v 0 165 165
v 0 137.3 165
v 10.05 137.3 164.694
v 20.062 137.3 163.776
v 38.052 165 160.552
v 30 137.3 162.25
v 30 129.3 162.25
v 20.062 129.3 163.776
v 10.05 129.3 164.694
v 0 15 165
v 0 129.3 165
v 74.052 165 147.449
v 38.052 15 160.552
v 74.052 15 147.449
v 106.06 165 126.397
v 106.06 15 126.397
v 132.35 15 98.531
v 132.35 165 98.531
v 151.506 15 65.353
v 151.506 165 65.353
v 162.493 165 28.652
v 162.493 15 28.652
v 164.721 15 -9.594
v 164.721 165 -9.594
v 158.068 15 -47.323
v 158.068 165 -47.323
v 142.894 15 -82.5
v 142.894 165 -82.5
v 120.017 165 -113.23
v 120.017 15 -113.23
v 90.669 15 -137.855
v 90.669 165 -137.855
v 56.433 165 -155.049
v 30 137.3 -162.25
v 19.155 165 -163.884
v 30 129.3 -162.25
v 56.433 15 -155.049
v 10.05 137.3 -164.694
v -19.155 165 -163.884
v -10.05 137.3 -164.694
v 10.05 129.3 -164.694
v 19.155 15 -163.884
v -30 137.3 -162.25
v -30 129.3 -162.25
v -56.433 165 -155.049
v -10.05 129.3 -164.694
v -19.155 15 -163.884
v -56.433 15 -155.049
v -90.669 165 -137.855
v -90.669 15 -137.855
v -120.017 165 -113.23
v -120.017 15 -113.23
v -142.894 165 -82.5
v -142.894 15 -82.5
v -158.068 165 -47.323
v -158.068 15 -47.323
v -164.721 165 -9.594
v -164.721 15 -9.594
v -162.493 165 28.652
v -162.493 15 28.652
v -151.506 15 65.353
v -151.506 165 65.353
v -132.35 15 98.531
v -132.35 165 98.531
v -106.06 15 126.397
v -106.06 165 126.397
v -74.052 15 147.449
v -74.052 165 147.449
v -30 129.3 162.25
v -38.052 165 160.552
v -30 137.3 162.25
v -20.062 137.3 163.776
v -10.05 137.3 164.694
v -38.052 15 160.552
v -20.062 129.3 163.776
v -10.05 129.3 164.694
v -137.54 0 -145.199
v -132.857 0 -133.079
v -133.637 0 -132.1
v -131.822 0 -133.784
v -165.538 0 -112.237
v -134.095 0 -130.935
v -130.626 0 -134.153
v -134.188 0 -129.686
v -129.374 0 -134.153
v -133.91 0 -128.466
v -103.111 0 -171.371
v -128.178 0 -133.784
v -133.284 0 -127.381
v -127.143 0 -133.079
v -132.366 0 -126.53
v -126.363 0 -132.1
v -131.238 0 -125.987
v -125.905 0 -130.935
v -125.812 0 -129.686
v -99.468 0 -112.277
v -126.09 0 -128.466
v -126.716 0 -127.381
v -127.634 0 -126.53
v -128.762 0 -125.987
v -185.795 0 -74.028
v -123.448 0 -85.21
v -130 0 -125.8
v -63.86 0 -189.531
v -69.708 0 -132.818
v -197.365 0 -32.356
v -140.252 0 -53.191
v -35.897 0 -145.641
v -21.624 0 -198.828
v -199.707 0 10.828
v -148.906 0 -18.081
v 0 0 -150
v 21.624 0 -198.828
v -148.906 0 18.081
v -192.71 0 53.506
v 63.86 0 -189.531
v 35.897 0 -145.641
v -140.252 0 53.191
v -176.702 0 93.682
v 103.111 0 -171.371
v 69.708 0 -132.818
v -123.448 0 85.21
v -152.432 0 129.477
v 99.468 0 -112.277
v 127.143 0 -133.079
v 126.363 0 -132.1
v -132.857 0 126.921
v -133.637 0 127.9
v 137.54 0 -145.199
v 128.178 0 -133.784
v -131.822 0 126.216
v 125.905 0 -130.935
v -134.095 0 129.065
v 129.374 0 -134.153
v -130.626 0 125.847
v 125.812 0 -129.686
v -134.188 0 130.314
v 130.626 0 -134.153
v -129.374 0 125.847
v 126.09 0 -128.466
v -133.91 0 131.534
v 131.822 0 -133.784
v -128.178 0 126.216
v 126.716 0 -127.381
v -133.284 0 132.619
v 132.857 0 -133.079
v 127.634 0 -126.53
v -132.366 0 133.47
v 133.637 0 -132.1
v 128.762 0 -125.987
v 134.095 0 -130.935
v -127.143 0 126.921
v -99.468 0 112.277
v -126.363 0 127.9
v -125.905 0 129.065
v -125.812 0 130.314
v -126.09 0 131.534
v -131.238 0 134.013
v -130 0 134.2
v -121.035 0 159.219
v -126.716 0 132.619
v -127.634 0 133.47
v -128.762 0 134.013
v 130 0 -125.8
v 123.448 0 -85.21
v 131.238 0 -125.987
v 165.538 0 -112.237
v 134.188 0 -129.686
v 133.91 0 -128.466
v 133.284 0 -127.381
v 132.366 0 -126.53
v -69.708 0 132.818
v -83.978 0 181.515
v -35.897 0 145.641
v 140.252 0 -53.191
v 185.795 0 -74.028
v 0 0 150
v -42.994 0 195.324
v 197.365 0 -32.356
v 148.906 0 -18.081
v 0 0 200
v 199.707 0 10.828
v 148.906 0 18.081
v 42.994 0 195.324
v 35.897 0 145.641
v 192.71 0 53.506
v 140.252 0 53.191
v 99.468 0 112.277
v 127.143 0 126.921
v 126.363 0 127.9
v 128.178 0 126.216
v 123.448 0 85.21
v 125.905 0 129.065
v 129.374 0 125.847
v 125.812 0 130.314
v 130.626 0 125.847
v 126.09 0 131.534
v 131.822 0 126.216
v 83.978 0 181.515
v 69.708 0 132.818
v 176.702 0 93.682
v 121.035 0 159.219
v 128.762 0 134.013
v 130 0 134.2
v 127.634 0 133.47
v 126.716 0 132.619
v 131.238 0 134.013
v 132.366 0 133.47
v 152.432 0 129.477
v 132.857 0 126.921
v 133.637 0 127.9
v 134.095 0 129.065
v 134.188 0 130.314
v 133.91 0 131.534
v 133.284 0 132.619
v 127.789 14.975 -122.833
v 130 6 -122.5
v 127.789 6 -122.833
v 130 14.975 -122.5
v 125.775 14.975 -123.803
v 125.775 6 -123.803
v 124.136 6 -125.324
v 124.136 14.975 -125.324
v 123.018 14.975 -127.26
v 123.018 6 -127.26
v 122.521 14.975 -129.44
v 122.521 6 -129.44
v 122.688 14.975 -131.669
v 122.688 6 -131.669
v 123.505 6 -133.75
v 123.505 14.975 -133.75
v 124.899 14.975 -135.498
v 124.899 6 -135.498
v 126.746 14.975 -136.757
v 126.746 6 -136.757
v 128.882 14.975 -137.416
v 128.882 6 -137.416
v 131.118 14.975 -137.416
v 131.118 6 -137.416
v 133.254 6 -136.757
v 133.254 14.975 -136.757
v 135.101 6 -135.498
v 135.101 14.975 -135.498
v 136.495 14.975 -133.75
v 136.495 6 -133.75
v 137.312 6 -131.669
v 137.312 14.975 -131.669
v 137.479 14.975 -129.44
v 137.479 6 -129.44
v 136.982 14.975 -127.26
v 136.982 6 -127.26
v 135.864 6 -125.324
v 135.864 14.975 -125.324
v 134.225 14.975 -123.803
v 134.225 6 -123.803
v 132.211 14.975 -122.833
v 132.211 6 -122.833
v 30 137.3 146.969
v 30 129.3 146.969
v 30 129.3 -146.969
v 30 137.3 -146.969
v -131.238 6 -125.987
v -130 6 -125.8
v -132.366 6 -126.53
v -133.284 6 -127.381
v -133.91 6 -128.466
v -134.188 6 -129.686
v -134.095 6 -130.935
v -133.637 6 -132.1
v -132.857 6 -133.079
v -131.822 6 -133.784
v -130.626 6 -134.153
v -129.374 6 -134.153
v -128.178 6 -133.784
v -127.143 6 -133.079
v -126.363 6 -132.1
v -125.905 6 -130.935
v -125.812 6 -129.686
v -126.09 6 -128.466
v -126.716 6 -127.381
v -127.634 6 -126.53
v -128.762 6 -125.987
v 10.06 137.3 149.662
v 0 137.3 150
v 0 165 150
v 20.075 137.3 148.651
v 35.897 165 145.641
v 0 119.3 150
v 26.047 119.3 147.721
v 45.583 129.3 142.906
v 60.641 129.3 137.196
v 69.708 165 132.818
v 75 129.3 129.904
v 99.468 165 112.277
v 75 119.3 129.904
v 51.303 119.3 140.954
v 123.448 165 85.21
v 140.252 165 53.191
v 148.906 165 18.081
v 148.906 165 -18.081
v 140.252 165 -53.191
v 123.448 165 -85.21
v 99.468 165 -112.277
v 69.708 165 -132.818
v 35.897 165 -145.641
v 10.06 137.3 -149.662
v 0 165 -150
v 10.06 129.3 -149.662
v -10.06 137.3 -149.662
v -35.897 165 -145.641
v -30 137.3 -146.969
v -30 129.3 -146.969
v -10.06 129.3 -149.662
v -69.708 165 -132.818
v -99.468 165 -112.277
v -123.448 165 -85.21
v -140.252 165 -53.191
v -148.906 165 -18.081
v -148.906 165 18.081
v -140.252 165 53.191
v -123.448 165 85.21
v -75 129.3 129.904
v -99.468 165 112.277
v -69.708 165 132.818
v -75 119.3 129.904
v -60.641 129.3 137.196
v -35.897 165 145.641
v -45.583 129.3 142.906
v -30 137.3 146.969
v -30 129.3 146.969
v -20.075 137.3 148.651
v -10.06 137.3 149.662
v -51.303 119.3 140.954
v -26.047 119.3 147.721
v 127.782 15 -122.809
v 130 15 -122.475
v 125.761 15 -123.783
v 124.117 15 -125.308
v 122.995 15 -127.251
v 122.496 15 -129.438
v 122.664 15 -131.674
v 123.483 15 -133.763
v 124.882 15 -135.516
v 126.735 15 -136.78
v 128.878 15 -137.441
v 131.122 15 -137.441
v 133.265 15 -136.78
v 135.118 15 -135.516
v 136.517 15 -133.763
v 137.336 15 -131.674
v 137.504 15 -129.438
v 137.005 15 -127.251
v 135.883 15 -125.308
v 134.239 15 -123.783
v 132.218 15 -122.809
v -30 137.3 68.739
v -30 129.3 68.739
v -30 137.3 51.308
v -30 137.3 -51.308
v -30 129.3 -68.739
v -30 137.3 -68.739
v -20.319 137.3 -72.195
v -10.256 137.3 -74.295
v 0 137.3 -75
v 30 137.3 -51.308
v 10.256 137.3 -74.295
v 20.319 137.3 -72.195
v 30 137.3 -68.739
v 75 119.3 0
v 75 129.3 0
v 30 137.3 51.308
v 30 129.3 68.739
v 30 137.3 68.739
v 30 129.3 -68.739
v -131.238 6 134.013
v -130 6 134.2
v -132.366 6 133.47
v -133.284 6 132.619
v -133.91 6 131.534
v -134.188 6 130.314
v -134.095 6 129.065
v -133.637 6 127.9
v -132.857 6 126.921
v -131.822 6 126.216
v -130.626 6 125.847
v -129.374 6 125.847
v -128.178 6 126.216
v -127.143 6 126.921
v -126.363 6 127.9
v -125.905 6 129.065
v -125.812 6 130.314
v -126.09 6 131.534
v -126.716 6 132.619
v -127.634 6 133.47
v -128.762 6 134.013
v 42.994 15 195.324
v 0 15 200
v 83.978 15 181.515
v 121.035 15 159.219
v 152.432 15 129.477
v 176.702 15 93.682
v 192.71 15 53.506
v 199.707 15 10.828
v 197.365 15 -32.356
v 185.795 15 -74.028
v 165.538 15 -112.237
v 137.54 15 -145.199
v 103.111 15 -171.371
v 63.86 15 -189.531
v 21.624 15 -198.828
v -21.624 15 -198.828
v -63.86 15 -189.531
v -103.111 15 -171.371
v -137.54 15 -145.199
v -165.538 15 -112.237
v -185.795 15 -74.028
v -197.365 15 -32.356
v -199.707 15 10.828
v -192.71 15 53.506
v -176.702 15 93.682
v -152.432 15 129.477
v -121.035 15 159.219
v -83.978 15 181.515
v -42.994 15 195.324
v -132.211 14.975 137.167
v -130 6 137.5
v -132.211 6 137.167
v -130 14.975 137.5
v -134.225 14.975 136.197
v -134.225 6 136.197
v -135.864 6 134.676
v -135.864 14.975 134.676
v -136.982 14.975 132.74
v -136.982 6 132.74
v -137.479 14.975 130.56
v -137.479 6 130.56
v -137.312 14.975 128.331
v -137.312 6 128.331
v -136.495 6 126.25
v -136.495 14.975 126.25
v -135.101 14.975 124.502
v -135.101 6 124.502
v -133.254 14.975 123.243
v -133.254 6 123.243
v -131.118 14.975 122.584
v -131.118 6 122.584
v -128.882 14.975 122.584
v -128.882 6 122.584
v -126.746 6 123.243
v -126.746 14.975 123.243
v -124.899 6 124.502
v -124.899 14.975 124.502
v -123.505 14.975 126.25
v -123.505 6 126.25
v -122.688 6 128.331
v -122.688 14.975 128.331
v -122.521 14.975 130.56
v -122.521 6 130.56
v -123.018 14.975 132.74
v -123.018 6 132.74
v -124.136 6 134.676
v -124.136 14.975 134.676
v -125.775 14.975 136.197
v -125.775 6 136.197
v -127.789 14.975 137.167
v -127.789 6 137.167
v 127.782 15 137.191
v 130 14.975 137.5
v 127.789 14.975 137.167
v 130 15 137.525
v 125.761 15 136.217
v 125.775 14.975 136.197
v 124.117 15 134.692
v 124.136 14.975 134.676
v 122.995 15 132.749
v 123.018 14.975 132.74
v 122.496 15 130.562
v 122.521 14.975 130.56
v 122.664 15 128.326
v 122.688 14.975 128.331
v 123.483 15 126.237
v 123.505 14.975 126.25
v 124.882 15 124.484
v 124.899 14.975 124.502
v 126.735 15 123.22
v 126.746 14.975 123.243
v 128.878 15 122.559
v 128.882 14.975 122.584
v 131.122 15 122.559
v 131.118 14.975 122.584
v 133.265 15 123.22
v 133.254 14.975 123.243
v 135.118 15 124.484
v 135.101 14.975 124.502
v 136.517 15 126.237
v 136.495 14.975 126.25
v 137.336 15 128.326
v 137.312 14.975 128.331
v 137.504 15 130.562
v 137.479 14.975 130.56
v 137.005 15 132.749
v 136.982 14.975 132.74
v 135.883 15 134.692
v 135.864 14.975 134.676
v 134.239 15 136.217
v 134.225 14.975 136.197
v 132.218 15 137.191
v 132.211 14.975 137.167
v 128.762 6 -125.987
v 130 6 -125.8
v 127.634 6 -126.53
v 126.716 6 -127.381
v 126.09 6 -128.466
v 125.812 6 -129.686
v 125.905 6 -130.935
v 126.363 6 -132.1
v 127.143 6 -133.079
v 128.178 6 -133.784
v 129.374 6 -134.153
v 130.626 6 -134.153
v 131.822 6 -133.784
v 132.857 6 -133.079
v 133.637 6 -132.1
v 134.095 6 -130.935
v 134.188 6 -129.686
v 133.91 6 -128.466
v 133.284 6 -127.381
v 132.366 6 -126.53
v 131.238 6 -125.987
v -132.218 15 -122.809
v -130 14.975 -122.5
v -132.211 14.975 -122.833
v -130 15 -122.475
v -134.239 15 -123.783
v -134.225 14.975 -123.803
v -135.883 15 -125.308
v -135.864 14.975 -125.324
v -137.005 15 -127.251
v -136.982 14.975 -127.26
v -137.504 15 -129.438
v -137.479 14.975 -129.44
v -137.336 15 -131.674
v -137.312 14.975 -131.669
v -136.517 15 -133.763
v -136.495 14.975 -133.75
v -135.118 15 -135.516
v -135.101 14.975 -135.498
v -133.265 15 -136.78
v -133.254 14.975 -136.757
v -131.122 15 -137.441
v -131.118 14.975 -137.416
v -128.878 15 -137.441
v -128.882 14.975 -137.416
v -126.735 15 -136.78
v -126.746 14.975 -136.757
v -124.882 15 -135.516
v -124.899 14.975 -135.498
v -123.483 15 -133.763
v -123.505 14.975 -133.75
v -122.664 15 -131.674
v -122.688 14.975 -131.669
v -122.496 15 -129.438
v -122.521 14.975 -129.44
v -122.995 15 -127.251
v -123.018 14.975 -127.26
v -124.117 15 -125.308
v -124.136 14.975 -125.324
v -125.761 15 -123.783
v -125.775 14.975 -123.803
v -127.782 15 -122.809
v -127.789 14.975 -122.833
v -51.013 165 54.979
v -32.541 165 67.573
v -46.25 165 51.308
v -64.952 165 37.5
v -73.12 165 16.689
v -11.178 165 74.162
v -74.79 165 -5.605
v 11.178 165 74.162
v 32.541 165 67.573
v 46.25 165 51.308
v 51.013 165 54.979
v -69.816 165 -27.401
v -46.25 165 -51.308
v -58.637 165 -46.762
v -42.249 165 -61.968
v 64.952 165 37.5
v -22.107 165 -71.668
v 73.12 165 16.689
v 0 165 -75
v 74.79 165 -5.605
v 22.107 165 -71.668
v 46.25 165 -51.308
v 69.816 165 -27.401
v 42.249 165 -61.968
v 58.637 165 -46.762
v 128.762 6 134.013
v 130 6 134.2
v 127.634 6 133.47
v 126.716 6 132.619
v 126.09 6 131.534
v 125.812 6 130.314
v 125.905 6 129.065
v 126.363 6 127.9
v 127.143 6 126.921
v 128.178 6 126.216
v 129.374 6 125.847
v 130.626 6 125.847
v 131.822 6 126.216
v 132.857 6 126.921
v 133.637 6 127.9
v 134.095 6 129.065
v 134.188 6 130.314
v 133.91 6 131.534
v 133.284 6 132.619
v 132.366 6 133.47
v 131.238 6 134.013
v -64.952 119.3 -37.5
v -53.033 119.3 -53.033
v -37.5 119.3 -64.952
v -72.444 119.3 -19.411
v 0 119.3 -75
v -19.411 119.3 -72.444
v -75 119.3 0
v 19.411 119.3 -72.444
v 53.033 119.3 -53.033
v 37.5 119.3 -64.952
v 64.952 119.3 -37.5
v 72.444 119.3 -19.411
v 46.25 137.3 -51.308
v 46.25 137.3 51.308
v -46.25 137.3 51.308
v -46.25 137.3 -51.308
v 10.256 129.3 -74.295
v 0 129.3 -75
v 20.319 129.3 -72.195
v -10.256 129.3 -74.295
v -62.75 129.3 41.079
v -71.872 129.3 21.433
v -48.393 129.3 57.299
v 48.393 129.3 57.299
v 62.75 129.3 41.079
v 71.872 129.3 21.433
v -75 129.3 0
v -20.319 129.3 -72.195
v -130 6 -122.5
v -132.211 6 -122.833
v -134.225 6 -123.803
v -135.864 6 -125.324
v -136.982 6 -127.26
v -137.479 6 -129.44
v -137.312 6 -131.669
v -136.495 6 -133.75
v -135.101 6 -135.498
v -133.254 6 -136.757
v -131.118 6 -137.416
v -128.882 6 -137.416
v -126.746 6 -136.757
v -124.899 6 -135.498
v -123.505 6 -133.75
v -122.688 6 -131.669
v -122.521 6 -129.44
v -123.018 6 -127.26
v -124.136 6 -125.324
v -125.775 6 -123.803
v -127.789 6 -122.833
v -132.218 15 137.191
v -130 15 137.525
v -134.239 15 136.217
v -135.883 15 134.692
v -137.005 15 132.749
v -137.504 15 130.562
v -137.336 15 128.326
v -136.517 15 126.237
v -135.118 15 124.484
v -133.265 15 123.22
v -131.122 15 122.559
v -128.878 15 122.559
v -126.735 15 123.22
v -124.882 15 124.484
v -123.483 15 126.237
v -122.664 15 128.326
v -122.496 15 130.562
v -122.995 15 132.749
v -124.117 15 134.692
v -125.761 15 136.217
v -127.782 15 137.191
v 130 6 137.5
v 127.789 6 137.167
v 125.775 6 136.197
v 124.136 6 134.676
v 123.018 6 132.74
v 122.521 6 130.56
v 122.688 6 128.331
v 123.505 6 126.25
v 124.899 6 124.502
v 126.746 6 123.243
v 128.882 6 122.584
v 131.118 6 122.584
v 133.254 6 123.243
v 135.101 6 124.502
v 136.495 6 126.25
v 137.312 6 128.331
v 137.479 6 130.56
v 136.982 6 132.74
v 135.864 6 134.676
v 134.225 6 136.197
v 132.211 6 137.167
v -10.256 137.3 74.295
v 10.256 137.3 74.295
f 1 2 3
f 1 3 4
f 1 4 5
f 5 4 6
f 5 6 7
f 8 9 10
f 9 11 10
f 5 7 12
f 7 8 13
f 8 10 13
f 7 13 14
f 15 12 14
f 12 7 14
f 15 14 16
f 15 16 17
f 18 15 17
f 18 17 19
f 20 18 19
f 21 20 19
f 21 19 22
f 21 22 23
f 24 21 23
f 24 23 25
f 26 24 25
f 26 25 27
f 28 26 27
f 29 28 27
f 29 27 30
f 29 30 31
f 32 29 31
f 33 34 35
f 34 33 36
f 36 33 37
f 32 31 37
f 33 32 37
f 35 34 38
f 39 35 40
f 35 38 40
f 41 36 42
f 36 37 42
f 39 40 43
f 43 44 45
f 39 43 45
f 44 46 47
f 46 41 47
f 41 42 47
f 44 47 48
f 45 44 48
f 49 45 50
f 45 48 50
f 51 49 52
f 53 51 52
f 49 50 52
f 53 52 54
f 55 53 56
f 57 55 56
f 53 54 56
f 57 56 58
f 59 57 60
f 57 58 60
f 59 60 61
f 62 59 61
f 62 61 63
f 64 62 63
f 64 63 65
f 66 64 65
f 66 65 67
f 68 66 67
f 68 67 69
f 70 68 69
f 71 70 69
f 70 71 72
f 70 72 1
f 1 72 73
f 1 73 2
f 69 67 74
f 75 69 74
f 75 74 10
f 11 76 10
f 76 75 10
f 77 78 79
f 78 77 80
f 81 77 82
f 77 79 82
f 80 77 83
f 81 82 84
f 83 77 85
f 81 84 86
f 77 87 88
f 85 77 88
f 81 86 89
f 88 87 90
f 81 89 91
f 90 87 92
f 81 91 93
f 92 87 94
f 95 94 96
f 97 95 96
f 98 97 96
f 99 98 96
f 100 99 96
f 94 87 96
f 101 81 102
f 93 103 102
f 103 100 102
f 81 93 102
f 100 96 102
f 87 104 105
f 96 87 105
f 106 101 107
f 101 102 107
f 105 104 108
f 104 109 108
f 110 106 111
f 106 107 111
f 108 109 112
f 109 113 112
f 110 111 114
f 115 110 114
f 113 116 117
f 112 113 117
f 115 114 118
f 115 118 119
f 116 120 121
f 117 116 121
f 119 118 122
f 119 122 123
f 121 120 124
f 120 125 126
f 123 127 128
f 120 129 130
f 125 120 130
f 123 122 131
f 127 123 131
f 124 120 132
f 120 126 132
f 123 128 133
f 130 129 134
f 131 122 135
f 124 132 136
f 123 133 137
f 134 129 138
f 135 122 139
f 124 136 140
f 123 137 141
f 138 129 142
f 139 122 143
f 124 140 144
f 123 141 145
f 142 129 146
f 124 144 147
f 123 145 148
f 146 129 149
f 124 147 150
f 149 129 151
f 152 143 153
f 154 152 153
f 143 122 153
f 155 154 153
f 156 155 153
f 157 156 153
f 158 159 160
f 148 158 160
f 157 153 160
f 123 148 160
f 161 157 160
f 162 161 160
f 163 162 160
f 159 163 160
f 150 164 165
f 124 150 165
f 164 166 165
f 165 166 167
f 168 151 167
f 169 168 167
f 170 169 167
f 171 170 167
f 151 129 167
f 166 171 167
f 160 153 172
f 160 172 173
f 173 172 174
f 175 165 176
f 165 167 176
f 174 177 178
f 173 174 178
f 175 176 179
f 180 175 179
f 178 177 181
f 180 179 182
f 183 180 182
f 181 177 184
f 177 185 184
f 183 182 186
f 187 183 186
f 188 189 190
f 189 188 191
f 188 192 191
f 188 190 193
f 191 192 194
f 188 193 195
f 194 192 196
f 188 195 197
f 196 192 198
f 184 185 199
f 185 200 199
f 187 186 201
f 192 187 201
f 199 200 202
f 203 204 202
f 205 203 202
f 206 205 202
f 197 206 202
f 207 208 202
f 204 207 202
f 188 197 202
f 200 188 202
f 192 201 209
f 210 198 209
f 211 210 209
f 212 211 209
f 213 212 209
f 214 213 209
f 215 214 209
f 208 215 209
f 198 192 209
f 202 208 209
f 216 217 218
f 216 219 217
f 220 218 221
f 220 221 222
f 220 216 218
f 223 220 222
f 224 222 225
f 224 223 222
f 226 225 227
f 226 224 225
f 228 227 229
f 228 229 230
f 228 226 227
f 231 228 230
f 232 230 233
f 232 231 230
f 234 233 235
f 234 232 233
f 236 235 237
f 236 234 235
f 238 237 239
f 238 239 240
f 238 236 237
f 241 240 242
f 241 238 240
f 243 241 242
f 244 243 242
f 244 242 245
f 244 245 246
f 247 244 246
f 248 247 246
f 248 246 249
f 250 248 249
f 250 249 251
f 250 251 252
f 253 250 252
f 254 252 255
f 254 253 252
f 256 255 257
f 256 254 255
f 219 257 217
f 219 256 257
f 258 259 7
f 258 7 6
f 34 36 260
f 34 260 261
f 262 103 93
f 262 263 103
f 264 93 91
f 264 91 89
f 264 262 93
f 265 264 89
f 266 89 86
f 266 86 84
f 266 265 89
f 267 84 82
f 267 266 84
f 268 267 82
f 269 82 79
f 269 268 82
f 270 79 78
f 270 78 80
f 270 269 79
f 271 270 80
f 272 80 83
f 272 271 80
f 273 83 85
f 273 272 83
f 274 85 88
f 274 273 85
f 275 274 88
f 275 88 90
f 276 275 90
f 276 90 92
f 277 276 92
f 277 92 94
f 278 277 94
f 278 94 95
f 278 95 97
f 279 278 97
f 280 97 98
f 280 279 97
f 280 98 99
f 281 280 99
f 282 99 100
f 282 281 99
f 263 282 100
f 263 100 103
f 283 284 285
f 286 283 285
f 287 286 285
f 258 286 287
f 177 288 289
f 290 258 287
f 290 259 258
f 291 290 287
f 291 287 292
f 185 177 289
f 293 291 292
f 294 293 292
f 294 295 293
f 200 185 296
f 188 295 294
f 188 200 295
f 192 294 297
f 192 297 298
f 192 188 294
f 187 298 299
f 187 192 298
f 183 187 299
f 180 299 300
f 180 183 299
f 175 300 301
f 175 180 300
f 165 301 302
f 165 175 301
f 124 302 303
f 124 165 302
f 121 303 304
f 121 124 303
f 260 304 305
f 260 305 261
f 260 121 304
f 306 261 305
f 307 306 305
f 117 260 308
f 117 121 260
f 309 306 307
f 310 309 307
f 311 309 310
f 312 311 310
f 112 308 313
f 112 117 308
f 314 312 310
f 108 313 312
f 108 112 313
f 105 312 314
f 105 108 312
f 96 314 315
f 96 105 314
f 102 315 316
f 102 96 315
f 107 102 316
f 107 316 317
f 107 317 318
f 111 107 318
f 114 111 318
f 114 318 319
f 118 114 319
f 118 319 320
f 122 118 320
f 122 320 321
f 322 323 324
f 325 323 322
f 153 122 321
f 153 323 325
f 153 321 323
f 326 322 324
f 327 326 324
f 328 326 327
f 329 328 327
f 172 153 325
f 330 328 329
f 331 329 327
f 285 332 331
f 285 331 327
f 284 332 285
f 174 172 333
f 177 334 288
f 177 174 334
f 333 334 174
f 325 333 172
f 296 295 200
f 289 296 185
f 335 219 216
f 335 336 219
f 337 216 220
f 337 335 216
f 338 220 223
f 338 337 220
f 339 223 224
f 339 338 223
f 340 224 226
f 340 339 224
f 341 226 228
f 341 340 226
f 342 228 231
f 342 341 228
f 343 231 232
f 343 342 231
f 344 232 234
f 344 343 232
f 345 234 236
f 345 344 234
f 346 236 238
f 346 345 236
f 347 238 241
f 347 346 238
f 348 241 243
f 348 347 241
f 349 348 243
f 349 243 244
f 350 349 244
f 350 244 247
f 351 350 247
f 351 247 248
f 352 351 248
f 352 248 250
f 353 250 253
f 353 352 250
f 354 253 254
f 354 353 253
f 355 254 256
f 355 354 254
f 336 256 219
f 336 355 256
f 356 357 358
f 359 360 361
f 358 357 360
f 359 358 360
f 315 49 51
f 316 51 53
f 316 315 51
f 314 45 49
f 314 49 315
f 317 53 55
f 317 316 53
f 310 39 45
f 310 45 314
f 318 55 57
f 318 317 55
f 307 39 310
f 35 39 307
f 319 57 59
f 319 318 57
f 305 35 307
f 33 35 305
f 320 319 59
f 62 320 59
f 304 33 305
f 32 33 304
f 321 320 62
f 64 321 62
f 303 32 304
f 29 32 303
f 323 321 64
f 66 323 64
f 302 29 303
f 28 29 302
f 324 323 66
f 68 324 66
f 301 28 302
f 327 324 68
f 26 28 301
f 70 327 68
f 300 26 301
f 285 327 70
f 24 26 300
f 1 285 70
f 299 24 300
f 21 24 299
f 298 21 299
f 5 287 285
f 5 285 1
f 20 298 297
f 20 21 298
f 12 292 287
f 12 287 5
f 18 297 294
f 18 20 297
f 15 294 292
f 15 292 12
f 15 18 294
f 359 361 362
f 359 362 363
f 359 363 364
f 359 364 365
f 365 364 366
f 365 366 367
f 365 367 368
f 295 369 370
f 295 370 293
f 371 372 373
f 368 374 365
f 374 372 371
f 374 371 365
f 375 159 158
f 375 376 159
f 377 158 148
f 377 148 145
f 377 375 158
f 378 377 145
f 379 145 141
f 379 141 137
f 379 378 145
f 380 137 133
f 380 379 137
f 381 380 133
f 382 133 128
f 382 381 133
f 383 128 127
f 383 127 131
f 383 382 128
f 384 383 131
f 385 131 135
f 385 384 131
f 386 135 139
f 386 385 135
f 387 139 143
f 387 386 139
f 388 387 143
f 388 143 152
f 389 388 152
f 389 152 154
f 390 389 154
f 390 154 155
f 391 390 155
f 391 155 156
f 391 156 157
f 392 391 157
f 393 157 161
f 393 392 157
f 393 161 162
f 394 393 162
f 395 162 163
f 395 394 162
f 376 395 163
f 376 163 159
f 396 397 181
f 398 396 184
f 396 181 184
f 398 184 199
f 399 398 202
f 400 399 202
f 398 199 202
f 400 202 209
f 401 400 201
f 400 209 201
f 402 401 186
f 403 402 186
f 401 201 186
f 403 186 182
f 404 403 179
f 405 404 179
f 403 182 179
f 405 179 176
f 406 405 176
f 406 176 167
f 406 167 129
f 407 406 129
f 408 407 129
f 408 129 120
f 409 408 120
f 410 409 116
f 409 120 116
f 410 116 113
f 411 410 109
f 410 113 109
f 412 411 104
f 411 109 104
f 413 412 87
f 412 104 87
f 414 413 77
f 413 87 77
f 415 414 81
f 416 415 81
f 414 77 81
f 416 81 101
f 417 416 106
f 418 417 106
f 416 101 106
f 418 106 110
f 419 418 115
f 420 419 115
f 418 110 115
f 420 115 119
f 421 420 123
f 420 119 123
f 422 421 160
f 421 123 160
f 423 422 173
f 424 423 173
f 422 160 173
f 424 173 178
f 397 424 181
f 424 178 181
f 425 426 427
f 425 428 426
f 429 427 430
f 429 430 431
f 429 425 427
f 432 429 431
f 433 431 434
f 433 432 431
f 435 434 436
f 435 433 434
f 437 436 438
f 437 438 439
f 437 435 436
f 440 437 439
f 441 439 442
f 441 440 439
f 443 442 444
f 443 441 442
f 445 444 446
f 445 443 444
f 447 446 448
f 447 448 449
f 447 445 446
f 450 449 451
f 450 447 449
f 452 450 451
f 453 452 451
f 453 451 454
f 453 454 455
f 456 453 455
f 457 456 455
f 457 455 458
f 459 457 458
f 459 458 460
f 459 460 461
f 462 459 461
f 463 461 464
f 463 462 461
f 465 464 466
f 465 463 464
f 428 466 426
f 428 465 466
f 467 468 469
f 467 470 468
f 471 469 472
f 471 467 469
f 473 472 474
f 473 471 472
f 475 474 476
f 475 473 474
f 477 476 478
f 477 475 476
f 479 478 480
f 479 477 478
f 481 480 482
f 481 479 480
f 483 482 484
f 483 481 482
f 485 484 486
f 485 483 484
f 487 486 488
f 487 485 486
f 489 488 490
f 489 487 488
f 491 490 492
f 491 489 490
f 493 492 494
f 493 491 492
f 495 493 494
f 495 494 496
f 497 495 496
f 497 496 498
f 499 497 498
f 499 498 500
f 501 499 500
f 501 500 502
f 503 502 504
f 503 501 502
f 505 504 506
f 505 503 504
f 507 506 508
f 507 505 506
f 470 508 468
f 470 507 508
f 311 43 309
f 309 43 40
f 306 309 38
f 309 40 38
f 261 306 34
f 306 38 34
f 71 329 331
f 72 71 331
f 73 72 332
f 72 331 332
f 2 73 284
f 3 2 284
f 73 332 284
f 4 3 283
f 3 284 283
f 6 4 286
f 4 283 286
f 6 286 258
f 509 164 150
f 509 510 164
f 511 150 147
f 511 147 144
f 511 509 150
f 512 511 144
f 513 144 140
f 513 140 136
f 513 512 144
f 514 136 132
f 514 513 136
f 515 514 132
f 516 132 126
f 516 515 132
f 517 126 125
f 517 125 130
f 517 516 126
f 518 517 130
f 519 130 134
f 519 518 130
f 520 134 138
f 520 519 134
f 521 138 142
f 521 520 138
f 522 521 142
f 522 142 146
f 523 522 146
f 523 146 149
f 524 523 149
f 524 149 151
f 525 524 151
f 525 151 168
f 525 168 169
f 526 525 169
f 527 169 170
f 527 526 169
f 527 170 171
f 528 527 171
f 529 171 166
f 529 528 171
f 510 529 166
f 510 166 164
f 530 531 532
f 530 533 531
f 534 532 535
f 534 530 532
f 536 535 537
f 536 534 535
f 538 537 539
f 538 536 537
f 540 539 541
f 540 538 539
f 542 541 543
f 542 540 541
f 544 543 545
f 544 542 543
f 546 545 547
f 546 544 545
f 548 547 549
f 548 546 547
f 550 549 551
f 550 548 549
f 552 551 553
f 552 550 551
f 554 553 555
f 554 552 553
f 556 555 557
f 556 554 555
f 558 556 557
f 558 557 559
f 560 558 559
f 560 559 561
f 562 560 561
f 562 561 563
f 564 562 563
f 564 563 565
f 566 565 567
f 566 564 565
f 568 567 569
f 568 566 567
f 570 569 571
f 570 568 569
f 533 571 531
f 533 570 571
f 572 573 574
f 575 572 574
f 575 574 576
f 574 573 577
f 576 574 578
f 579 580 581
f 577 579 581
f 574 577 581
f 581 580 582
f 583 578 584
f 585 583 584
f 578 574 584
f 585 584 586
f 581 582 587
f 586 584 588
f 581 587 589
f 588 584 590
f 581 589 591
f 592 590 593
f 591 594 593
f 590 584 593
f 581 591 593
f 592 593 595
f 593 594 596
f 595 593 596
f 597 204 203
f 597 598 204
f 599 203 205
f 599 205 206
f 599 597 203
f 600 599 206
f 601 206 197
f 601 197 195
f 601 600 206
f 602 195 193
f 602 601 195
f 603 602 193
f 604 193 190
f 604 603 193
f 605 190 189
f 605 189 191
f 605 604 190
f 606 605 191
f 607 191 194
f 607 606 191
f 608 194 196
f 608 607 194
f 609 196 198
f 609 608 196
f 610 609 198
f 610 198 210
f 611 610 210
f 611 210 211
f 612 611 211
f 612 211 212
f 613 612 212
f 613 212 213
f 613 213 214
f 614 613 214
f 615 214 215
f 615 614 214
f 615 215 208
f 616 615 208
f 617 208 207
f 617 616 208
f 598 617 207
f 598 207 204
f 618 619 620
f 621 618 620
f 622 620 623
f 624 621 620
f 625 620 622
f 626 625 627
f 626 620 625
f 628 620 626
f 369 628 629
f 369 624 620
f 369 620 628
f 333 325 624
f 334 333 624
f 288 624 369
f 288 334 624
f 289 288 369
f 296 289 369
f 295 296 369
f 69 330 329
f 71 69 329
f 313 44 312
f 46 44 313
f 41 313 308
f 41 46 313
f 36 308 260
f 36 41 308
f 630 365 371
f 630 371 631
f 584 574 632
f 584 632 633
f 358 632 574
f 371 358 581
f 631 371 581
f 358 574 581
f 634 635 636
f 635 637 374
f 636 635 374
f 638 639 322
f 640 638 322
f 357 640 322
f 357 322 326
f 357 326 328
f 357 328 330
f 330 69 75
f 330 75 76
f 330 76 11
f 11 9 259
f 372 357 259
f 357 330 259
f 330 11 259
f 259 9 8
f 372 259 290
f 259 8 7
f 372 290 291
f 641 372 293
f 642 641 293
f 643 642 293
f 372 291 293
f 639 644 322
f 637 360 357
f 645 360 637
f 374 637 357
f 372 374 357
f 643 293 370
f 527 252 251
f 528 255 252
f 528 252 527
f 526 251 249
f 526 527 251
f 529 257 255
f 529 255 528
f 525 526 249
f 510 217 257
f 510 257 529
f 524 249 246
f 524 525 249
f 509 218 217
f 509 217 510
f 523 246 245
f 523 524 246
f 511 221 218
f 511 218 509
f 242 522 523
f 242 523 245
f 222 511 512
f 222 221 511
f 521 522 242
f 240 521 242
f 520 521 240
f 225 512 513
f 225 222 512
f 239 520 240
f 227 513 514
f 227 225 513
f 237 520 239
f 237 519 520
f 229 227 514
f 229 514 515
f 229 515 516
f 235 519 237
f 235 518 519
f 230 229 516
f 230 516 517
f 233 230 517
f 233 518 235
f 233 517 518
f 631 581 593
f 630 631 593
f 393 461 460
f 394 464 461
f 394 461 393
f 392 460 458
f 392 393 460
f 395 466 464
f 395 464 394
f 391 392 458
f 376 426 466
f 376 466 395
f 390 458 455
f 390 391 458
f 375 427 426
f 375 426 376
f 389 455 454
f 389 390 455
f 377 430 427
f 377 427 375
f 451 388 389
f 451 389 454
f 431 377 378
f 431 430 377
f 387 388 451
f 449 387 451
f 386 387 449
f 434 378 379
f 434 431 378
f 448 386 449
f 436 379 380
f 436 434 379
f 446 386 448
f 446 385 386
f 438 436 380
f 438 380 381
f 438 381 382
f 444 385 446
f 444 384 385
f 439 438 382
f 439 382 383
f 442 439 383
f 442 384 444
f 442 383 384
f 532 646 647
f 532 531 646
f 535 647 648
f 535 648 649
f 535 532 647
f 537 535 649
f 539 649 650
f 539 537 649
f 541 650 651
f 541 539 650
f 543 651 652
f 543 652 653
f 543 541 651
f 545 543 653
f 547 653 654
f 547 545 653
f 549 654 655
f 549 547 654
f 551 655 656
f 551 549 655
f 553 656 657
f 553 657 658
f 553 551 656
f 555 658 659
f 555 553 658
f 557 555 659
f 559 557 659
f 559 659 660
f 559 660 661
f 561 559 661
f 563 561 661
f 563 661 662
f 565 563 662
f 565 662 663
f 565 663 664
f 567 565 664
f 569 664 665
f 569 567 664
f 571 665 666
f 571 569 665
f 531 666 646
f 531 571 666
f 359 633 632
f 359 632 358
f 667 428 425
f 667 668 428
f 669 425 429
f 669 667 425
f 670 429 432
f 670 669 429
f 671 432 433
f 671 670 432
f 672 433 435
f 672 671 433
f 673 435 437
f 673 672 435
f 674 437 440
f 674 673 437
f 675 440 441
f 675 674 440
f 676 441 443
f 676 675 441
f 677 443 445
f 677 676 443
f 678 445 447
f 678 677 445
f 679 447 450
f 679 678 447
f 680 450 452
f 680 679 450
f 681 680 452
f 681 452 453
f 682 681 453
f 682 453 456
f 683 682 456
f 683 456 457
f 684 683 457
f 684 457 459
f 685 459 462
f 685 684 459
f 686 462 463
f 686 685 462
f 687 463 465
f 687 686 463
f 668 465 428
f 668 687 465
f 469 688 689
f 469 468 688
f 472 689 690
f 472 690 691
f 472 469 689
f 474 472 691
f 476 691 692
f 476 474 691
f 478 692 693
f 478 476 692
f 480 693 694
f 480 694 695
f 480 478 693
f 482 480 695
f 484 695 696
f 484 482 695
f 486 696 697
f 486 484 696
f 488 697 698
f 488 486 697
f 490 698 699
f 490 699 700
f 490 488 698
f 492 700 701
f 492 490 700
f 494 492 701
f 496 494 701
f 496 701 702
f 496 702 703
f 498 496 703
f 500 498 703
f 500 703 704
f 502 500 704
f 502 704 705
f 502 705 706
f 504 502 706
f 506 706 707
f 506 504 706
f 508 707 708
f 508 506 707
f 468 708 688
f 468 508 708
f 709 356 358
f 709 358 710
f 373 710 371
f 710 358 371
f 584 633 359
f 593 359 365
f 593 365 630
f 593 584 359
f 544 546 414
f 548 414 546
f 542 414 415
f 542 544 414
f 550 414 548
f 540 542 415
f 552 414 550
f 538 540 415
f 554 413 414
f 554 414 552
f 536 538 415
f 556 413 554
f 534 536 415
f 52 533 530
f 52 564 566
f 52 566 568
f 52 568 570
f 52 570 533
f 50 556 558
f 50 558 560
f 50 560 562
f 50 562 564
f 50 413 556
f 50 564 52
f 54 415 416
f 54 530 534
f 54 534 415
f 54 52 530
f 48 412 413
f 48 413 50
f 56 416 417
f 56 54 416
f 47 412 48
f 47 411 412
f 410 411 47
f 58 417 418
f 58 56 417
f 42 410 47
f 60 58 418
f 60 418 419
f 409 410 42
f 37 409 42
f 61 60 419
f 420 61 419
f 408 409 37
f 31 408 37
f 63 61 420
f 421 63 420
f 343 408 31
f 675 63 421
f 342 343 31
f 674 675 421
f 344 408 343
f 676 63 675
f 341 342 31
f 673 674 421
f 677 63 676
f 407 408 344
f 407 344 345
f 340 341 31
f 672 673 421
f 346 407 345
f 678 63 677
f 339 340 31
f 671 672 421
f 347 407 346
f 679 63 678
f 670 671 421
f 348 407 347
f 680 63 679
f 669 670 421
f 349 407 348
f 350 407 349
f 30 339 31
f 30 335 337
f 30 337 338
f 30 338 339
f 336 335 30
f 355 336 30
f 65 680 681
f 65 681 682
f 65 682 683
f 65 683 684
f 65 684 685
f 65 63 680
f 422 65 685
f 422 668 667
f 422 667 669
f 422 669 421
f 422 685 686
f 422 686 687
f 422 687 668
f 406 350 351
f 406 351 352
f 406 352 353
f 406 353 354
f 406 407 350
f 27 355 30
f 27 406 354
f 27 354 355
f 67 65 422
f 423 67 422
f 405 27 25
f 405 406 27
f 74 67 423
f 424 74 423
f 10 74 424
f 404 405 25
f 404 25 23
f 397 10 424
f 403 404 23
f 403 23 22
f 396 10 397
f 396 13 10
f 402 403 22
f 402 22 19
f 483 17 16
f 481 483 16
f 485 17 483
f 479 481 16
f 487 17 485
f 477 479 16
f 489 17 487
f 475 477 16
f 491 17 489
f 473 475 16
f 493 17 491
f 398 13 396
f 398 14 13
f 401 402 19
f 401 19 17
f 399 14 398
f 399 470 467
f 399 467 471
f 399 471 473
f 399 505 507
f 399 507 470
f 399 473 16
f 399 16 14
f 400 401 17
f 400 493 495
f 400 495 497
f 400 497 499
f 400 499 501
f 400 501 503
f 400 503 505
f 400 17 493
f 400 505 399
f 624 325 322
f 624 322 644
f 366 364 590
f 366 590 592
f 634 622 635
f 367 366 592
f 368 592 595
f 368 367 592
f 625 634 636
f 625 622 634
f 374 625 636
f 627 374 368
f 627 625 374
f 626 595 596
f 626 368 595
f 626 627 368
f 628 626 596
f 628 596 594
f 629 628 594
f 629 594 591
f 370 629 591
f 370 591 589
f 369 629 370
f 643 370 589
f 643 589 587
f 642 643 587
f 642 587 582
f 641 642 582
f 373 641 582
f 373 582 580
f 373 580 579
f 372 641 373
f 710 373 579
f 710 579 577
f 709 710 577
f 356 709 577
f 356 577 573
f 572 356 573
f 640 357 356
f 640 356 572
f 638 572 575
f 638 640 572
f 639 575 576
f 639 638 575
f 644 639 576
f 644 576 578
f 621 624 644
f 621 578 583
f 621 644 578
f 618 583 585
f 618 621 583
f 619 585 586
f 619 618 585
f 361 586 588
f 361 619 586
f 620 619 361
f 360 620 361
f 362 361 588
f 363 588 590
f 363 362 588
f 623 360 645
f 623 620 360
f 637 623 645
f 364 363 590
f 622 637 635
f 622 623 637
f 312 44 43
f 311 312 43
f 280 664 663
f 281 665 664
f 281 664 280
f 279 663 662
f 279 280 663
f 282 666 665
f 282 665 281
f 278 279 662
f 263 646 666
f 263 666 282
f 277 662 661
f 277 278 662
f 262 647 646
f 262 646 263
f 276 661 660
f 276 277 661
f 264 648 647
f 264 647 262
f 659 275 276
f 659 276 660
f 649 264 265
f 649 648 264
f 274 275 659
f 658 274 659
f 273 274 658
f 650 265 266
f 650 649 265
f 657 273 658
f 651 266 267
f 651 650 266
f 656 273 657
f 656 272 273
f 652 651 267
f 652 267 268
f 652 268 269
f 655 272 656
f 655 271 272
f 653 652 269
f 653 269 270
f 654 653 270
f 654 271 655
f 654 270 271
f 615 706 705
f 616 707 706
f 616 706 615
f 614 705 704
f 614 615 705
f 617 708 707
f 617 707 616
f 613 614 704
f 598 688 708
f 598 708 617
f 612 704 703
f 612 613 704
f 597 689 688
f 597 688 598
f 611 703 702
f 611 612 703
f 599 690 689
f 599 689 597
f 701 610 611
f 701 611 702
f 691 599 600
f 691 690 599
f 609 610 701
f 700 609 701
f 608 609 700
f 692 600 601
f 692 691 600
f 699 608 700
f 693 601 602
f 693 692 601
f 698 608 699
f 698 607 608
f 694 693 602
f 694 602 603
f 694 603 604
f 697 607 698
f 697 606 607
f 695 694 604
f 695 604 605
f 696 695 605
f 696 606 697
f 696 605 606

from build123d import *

# Parameters (mm, degrees)
SKETCH_1_R                  = 200
SKETCH_1_R_2                = 150
EXTRUDE_1_DEPTH             = 15
SKETCH_2_R                  = 165
SKETCH_2_R_2                = 150
EXTRUDE_2_DEPTH             = 150
HOLE_WIZARD_M8_1_AT_2_COUNT = 2
HOLE_WIZARD_M8_1_AT_2_PITCH = 260
HOLE_WIZARD_M8_1_AT_3_COUNT = 2
HOLE_WIZARD_M8_1_AT_3_PITCH = 367.695526217
HOLE_WIZARD_M8_1_AT_4_COUNT = 2
HOLE_WIZARD_M8_1_AT_4_PITCH = 260
SKETCH_8_R                  = 75
EXTRUDE_5_DEPTH             = 165
SKETCH_11_W                 = 92.5
SKETCH_11_H                 = 102.616555874
CUT_EXTRUDE_3_DEPTH         = 27.7
SKETCH_12_W                 = 60
SKETCH_12_H                 = 102.616555874
CUT_EXTRUDE_6_DEPTH         = 8
CUT_EXTRUDE_7_DEPTH         = 220
CUT_EXTRUDE_7_DEPTH_BACK    = 165
SKETCH_14_W                 = 60
SKETCH_14_H                 = 8
SKETCH_15_R                 = 75
CUT_EXTRUDE_8_DEPTH         = 119.3
EXTRUDE_6_DEPTH             = 10


with BuildPart() as part:
    # 草图1 → 凸台-拉伸1 (new body)
    with BuildSketch(Plane(origin=(0, 0, 0), x_dir=(1, 0, 0), z_dir=(0, 1, 0))):
        with Locations(Location((0, 0, 0), (0, 0, 270))):
            Circle(SKETCH_1_R)
        with Locations(Location((0, 0, 0), (0, 0, 270))):
            Circle(SKETCH_1_R_2, mode=Mode.SUBTRACT)
    extrude(amount=EXTRUDE_1_DEPTH)

    # 草图2 → 凸台-拉伸2 (add)
    with BuildSketch(Plane(origin=(0, 15, 0), x_dir=(1, 0, 0), z_dir=(0, 1, 0))):
        with Locations(Location((0, 0, 0), (0, 0, 270))):
            Circle(SKETCH_2_R)
        with Locations(Location((0, 0, 0), (0, 0, 270))):
            Circle(SKETCH_2_R_2, mode=Mode.SUBTRACT)
    extrude(amount=EXTRUDE_2_DEPTH)

    # 草图5 → M8 六角圆柱头螺钉的柱形沉头孔1 (revolve, cut)
    with BuildSketch(Plane(origin=(-130, 15, -130), x_dir=(0, 0, 1), z_dir=(1, 0, 0))):
        Polygon((0, 0), (0, 15), (4.2, 15), (4.2, 9), (7.5, 9), (7.5, 0.025), (7.525, 0), align=None)
    hole_wizard_m8_1 = revolve(axis=Axis((-130, 21.35, -130), (0, -1, 0)), mode=Mode.SUBTRACT)

    # M8 六角圆柱头螺钉的柱形沉头孔1 at 2: M8 六角圆柱头螺钉的柱形沉头孔1 ×2
    with Locations(*[(i * HOLE_WIZARD_M8_1_AT_2_PITCH, 0, 0) for i in range(1, HOLE_WIZARD_M8_1_AT_2_COUNT)]):
        add(hole_wizard_m8_1, mode=Mode.SUBTRACT)

    # M8 六角圆柱头螺钉的柱形沉头孔1 at 3: M8 六角圆柱头螺钉的柱形沉头孔1 ×2
    with Locations(*[Vector(0.7071067811865476, 0, 0.7071067811865476) * (i * HOLE_WIZARD_M8_1_AT_3_PITCH) for i in range(1, HOLE_WIZARD_M8_1_AT_3_COUNT)]):
        add(hole_wizard_m8_1, mode=Mode.SUBTRACT)

    # M8 六角圆柱头螺钉的柱形沉头孔1 at 4: M8 六角圆柱头螺钉的柱形沉头孔1 ×2
    with Locations(*[(0, 0, i * HOLE_WIZARD_M8_1_AT_4_PITCH) for i in range(1, HOLE_WIZARD_M8_1_AT_4_COUNT)]):
        add(hole_wizard_m8_1, mode=Mode.SUBTRACT)


with BuildPart() as body_2:
    # 草图8 → 凸台-拉伸5 (new body)
    with BuildSketch(Plane.XZ):
        with Locations(Location((0, 0, 0), (0, 0, 270))):
            Circle(SKETCH_8_R)
    extrude(amount=-EXTRUDE_5_DEPTH)

    # 草图11 → 切除-拉伸3 (cut)
    with BuildSketch(Plane(origin=(0, 165, 0), x_dir=(1, 0, 0), z_dir=(0, 1, 0))):
        Rectangle(SKETCH_11_W, SKETCH_11_H)
    extrude(amount=-CUT_EXTRUDE_3_DEPTH, mode=Mode.SUBTRACT)

    # 草图12 → 切除-拉伸6 (cut)
    with BuildSketch(Plane(origin=(0, 137.3, 0), x_dir=(1, 0, 0), z_dir=(0, 1, 0))):
        Rectangle(SKETCH_12_W, SKETCH_12_H)
    extrude(amount=-CUT_EXTRUDE_6_DEPTH, mode=Mode.SUBTRACT)


with BuildPart() as cut_extrude_7_tool:
    # 草图14 → 切除-拉伸7 (new, two sides: drawn at the far end of the back side and taken through both)
    with BuildSketch(Plane.XY.offset(-51.308277937).offset(-CUT_EXTRUDE_7_DEPTH_BACK)):
        with Locations((0, 133.3)):
            Rectangle(SKETCH_14_W, SKETCH_14_H)
    extrude(amount=CUT_EXTRUDE_7_DEPTH + CUT_EXTRUDE_7_DEPTH_BACK)


with BuildPart() as part_1:
    add(part.part)

    # 切除-拉伸7: cut by cut_extrude_7_tool
    add(cut_extrude_7_tool.part, mode=Mode.SUBTRACT)



with BuildPart() as body_2_1:
    add(body_2.part)

    # 切除-拉伸7: cut by cut_extrude_7_tool
    add(cut_extrude_7_tool.part, mode=Mode.SUBTRACT)

    # 草图15 → 切除-拉伸8 (cut)
    with BuildSketch(Plane.XZ):
        with Locations(Location((0, 0, 0), (0, 0, 270))):
            Circle(SKETCH_15_R)
    extrude(amount=-CUT_EXTRUDE_8_DEPTH, mode=Mode.SUBTRACT)


with BuildPart() as part_2:
    add(part_1.part)

    add(body_2_1.part)  # 凸台-拉伸6 merges body 2
    # 草图16 → 凸台-拉伸6 (add)
    with BuildSketch(Plane.XZ.offset(-119.3)):
        with BuildLine():
            Line((-75, 129.903810568), (-75, 0))
            ThreePointArc((-75, 0), (0, 75), (75, 0))
            Line((75, 0), (75, 129.903810568))
            ThreePointArc((75, 129.903810568), (0, 150), (-75, 129.903810568))
        make_face()
    extrude(amount=-EXTRUDE_6_DEPTH)


solid = part_2.part
